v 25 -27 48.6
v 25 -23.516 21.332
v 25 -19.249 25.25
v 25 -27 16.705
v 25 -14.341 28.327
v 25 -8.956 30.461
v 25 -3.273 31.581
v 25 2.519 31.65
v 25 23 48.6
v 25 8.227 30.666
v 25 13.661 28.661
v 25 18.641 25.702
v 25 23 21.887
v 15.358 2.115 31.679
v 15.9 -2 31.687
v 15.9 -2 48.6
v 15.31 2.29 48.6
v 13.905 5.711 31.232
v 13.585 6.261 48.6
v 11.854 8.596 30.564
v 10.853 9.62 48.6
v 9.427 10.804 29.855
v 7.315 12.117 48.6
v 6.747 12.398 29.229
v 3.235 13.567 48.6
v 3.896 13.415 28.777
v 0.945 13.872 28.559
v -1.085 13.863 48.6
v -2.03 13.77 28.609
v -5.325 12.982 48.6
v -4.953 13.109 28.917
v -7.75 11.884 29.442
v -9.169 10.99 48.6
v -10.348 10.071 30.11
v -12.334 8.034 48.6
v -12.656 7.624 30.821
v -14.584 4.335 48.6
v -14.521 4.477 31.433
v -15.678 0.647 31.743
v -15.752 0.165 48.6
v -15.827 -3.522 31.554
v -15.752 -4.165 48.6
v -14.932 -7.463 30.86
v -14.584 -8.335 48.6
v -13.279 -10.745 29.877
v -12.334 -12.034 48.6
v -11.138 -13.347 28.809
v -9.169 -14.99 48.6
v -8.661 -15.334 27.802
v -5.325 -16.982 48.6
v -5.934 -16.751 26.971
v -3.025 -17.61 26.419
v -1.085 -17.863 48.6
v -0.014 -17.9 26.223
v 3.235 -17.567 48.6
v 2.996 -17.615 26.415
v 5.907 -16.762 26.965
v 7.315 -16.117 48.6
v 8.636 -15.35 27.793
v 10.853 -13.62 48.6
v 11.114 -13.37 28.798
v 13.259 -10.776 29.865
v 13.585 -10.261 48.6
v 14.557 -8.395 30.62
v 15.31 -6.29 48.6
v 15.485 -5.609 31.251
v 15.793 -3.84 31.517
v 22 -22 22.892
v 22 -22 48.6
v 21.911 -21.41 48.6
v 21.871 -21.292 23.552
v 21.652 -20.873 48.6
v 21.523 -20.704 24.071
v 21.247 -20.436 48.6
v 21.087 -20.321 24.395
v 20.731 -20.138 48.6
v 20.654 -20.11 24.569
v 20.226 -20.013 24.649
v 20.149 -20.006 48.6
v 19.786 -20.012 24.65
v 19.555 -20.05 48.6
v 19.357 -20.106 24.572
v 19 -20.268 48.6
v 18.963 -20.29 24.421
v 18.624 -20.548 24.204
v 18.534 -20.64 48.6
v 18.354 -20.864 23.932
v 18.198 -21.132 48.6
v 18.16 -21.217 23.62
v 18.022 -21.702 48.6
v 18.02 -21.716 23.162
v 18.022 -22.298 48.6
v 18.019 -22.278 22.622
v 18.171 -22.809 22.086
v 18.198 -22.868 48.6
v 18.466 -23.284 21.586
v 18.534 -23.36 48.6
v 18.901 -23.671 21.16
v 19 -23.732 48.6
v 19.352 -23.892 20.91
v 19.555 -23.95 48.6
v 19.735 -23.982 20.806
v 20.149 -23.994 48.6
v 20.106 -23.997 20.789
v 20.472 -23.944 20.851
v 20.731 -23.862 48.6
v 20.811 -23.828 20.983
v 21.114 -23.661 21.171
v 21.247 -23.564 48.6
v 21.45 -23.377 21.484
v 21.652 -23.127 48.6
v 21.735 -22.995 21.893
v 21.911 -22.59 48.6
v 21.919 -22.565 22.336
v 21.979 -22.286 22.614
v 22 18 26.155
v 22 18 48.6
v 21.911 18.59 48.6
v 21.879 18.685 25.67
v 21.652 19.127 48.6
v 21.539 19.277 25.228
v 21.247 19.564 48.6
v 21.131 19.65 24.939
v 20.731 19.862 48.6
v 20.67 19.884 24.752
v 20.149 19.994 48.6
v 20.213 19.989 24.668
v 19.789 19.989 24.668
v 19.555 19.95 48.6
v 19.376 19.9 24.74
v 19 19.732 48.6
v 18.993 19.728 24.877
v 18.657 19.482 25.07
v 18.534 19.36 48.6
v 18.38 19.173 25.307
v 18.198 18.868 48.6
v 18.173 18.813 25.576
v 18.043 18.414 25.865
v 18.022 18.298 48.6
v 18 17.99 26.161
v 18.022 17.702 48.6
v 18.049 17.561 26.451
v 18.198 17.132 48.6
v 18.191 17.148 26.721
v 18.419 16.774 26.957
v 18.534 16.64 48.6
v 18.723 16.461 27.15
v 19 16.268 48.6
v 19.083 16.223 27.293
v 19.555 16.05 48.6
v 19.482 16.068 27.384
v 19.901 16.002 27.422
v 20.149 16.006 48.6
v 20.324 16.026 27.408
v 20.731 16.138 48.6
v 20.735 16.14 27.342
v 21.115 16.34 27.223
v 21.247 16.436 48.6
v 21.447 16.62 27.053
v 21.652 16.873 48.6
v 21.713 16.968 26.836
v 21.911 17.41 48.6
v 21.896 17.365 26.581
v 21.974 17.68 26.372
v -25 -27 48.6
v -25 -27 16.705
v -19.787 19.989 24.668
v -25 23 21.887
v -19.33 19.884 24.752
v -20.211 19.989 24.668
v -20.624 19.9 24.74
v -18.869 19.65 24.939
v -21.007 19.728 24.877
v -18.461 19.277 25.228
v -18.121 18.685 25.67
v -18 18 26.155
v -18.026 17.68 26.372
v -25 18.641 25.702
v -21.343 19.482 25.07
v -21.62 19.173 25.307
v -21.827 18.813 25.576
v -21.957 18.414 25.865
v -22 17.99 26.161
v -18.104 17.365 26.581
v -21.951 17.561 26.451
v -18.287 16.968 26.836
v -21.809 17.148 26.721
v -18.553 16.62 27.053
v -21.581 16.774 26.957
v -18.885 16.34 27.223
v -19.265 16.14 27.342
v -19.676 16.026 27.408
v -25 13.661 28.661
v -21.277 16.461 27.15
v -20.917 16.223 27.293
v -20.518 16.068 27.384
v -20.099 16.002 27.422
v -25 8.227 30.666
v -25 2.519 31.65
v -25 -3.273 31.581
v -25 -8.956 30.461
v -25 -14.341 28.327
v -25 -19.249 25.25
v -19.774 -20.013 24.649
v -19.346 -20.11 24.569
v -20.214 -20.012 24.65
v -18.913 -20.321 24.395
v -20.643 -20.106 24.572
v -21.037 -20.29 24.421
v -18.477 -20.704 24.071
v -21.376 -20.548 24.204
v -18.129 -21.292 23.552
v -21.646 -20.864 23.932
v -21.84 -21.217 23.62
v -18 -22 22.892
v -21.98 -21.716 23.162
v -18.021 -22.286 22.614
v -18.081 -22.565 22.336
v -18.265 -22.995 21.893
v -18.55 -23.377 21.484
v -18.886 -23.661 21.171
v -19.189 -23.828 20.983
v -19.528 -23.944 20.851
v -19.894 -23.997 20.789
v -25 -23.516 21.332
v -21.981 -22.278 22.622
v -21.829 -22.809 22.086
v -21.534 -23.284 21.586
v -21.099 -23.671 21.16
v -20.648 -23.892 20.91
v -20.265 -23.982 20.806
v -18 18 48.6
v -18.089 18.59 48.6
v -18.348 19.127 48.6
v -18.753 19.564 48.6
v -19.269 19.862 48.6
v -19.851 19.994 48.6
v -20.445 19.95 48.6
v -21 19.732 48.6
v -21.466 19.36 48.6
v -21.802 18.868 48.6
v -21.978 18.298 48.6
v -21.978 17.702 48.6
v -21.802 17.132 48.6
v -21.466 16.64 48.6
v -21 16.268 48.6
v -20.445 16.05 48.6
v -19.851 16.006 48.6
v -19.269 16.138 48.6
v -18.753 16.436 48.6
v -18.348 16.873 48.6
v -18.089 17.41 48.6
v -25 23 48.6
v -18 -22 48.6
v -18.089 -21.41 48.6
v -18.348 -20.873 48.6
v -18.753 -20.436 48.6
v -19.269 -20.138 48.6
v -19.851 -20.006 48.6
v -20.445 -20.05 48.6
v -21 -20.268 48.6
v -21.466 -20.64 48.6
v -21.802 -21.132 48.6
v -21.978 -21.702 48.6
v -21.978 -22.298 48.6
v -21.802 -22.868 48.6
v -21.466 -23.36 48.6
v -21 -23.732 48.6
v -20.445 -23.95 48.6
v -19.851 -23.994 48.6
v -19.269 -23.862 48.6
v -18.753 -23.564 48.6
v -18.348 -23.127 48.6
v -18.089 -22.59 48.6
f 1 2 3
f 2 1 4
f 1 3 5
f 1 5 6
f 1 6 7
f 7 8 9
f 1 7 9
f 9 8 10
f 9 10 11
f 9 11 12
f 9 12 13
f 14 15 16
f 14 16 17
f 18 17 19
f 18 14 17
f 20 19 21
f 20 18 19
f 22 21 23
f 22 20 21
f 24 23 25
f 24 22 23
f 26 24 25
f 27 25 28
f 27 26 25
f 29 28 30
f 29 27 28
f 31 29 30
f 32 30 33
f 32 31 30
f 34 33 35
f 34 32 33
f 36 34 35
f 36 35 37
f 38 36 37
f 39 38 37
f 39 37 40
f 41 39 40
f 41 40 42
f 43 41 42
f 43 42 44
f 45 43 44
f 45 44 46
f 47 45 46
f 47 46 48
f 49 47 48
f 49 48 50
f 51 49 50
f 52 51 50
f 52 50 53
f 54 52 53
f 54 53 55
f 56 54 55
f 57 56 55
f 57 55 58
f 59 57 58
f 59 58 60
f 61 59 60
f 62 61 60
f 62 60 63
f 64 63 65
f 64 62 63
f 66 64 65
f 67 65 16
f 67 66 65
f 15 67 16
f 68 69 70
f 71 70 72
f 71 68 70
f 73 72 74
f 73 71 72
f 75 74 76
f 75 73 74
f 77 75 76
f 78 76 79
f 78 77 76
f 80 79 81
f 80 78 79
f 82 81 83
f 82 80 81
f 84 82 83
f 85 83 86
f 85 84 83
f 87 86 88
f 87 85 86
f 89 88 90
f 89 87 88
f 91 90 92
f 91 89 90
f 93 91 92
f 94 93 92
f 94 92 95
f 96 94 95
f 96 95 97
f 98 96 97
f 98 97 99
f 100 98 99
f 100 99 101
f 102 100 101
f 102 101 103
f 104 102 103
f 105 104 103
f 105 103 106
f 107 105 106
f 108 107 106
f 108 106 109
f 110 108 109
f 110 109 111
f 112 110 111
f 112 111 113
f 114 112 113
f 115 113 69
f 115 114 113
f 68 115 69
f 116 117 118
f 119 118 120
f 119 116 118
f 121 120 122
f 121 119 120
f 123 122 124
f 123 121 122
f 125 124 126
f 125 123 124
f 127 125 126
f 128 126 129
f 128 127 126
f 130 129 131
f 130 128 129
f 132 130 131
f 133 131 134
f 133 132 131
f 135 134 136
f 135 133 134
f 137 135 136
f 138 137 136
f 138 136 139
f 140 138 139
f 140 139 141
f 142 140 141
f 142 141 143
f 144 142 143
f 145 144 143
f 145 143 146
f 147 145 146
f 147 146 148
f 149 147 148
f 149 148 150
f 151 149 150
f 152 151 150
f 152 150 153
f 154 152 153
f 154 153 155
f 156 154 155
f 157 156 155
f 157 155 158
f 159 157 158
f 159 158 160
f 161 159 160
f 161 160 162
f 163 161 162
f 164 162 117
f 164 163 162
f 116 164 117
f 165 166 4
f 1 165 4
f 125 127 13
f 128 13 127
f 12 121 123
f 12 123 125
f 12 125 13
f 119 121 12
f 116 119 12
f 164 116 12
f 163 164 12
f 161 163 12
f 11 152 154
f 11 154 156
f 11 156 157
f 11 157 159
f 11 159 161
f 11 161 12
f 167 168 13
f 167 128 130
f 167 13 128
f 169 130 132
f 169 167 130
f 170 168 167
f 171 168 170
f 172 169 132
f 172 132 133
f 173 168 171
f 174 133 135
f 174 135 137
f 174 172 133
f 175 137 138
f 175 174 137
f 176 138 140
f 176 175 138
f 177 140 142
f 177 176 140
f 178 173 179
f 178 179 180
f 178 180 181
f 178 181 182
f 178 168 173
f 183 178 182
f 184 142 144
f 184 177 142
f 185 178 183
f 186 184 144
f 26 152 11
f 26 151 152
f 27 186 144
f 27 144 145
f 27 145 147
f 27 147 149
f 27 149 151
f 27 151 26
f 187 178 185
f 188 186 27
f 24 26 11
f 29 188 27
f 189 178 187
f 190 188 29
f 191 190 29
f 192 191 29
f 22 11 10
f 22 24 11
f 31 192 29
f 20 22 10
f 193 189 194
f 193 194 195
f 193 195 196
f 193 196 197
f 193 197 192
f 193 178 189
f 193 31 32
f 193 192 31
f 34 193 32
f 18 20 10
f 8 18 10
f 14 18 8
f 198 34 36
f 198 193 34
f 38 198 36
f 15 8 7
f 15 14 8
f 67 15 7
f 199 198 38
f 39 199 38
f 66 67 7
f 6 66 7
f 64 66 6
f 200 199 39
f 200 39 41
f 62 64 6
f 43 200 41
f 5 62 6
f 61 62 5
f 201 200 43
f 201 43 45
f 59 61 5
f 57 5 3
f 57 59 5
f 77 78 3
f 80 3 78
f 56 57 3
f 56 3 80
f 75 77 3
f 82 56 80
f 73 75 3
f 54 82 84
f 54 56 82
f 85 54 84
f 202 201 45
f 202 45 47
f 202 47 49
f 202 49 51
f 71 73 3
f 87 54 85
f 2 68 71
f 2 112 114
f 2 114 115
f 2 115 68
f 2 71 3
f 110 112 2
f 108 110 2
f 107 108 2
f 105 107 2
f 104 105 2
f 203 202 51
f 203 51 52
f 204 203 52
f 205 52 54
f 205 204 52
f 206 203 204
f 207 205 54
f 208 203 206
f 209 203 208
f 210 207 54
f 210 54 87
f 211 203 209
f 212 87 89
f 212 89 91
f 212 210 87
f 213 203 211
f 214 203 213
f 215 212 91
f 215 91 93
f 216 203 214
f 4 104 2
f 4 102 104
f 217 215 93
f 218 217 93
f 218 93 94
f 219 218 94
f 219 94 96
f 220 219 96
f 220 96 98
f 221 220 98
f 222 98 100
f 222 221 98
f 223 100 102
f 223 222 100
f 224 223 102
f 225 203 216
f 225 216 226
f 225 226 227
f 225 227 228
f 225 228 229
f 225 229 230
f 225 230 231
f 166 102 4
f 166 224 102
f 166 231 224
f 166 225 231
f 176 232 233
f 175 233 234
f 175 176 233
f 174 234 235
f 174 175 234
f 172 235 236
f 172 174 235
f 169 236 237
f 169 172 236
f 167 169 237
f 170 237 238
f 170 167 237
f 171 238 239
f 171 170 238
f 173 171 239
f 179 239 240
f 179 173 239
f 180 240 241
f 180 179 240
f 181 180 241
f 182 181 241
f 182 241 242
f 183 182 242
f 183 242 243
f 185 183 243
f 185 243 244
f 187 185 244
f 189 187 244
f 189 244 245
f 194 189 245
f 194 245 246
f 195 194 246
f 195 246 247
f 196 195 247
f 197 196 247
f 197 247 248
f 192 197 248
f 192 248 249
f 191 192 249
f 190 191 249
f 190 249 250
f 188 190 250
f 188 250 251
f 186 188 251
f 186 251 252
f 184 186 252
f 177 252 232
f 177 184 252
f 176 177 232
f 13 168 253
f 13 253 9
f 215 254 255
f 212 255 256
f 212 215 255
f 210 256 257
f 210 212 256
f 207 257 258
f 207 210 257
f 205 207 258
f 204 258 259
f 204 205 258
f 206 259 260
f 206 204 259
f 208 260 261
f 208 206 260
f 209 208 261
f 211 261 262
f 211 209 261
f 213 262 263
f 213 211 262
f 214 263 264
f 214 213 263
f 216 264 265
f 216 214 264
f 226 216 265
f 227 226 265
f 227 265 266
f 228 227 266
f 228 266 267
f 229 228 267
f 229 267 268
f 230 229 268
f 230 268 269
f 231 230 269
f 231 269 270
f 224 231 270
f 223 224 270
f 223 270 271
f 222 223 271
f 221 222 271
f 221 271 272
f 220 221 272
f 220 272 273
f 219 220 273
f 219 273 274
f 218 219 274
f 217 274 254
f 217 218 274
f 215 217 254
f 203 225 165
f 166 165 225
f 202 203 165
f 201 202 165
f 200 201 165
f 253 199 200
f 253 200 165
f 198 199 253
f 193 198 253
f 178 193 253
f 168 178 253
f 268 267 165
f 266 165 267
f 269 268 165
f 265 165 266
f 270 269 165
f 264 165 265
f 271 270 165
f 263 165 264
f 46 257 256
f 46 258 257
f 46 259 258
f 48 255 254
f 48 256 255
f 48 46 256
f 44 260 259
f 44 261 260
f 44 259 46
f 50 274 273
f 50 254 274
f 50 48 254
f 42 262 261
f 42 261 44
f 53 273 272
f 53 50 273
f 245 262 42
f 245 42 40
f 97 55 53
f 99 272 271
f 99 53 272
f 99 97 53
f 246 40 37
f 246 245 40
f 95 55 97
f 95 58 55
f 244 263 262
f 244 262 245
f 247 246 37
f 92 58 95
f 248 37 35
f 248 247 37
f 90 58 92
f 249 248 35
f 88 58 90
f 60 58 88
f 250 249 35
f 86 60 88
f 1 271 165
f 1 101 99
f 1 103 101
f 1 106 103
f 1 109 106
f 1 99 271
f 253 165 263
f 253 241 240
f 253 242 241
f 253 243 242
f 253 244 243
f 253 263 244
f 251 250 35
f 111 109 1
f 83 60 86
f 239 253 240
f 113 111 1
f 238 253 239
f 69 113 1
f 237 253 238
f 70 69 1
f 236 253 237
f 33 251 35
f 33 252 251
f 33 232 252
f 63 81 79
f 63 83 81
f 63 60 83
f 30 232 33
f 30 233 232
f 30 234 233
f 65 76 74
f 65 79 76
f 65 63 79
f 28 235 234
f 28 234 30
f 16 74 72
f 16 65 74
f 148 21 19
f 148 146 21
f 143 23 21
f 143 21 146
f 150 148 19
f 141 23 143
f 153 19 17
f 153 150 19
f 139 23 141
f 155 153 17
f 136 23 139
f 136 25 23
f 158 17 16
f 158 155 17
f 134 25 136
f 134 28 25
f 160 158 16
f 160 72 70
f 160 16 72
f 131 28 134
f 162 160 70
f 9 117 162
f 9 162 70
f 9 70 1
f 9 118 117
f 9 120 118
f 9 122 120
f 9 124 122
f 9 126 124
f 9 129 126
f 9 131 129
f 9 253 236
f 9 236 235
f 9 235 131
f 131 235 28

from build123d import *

# Parameters (mm, degrees)
SKETCH1_W               = 50
SKETCH1_H               = 50
SKETCH1_R               = 15.9
SKETCH1_R_2             = 2
BOSS_EXTRUDE1_DEPTH     = 48.6
CUT_EXTRUDE1_DEPTH      = 61.958674526
CUT_EXTRUDE1_DEPTH_BACK = 61.958674526
SKETCH2_R               = 31.75


with BuildPart() as part:
    # Sketch1 → Boss-Extrude1 (new body)
    with BuildSketch(Plane.XY):
        with Locations((0, -2)):
            Rectangle(SKETCH1_W, SKETCH1_H)
        with Locations((0, -2)):
            Circle(SKETCH1_R, mode=Mode.SUBTRACT)
        with Locations((-20, 18)):
            Circle(SKETCH1_R_2, mode=Mode.SUBTRACT)
        with Locations((20, 18)):
            Circle(SKETCH1_R_2, mode=Mode.SUBTRACT)
        with Locations((20, -22)):
            Circle(SKETCH1_R_2, mode=Mode.SUBTRACT)
        with Locations((-20, -22)):
            Circle(SKETCH1_R_2, mode=Mode.SUBTRACT)
    extrude(amount=BOSS_EXTRUDE1_DEPTH)

    # Sketch2 → Cut-Extrude1 (cut, two sides: drawn at the far end of the back side and taken through both)
    with BuildSketch(Plane(origin=(0, 0, 0), x_dir=(0, 0, -1), z_dir=(1, 0, 0)).offset(-CUT_EXTRUDE1_DEPTH_BACK)):
        Circle(SKETCH2_R)
    extrude(amount=CUT_EXTRUDE1_DEPTH + CUT_EXTRUDE1_DEPTH_BACK, mode=Mode.SUBTRACT)


solid = part.part
